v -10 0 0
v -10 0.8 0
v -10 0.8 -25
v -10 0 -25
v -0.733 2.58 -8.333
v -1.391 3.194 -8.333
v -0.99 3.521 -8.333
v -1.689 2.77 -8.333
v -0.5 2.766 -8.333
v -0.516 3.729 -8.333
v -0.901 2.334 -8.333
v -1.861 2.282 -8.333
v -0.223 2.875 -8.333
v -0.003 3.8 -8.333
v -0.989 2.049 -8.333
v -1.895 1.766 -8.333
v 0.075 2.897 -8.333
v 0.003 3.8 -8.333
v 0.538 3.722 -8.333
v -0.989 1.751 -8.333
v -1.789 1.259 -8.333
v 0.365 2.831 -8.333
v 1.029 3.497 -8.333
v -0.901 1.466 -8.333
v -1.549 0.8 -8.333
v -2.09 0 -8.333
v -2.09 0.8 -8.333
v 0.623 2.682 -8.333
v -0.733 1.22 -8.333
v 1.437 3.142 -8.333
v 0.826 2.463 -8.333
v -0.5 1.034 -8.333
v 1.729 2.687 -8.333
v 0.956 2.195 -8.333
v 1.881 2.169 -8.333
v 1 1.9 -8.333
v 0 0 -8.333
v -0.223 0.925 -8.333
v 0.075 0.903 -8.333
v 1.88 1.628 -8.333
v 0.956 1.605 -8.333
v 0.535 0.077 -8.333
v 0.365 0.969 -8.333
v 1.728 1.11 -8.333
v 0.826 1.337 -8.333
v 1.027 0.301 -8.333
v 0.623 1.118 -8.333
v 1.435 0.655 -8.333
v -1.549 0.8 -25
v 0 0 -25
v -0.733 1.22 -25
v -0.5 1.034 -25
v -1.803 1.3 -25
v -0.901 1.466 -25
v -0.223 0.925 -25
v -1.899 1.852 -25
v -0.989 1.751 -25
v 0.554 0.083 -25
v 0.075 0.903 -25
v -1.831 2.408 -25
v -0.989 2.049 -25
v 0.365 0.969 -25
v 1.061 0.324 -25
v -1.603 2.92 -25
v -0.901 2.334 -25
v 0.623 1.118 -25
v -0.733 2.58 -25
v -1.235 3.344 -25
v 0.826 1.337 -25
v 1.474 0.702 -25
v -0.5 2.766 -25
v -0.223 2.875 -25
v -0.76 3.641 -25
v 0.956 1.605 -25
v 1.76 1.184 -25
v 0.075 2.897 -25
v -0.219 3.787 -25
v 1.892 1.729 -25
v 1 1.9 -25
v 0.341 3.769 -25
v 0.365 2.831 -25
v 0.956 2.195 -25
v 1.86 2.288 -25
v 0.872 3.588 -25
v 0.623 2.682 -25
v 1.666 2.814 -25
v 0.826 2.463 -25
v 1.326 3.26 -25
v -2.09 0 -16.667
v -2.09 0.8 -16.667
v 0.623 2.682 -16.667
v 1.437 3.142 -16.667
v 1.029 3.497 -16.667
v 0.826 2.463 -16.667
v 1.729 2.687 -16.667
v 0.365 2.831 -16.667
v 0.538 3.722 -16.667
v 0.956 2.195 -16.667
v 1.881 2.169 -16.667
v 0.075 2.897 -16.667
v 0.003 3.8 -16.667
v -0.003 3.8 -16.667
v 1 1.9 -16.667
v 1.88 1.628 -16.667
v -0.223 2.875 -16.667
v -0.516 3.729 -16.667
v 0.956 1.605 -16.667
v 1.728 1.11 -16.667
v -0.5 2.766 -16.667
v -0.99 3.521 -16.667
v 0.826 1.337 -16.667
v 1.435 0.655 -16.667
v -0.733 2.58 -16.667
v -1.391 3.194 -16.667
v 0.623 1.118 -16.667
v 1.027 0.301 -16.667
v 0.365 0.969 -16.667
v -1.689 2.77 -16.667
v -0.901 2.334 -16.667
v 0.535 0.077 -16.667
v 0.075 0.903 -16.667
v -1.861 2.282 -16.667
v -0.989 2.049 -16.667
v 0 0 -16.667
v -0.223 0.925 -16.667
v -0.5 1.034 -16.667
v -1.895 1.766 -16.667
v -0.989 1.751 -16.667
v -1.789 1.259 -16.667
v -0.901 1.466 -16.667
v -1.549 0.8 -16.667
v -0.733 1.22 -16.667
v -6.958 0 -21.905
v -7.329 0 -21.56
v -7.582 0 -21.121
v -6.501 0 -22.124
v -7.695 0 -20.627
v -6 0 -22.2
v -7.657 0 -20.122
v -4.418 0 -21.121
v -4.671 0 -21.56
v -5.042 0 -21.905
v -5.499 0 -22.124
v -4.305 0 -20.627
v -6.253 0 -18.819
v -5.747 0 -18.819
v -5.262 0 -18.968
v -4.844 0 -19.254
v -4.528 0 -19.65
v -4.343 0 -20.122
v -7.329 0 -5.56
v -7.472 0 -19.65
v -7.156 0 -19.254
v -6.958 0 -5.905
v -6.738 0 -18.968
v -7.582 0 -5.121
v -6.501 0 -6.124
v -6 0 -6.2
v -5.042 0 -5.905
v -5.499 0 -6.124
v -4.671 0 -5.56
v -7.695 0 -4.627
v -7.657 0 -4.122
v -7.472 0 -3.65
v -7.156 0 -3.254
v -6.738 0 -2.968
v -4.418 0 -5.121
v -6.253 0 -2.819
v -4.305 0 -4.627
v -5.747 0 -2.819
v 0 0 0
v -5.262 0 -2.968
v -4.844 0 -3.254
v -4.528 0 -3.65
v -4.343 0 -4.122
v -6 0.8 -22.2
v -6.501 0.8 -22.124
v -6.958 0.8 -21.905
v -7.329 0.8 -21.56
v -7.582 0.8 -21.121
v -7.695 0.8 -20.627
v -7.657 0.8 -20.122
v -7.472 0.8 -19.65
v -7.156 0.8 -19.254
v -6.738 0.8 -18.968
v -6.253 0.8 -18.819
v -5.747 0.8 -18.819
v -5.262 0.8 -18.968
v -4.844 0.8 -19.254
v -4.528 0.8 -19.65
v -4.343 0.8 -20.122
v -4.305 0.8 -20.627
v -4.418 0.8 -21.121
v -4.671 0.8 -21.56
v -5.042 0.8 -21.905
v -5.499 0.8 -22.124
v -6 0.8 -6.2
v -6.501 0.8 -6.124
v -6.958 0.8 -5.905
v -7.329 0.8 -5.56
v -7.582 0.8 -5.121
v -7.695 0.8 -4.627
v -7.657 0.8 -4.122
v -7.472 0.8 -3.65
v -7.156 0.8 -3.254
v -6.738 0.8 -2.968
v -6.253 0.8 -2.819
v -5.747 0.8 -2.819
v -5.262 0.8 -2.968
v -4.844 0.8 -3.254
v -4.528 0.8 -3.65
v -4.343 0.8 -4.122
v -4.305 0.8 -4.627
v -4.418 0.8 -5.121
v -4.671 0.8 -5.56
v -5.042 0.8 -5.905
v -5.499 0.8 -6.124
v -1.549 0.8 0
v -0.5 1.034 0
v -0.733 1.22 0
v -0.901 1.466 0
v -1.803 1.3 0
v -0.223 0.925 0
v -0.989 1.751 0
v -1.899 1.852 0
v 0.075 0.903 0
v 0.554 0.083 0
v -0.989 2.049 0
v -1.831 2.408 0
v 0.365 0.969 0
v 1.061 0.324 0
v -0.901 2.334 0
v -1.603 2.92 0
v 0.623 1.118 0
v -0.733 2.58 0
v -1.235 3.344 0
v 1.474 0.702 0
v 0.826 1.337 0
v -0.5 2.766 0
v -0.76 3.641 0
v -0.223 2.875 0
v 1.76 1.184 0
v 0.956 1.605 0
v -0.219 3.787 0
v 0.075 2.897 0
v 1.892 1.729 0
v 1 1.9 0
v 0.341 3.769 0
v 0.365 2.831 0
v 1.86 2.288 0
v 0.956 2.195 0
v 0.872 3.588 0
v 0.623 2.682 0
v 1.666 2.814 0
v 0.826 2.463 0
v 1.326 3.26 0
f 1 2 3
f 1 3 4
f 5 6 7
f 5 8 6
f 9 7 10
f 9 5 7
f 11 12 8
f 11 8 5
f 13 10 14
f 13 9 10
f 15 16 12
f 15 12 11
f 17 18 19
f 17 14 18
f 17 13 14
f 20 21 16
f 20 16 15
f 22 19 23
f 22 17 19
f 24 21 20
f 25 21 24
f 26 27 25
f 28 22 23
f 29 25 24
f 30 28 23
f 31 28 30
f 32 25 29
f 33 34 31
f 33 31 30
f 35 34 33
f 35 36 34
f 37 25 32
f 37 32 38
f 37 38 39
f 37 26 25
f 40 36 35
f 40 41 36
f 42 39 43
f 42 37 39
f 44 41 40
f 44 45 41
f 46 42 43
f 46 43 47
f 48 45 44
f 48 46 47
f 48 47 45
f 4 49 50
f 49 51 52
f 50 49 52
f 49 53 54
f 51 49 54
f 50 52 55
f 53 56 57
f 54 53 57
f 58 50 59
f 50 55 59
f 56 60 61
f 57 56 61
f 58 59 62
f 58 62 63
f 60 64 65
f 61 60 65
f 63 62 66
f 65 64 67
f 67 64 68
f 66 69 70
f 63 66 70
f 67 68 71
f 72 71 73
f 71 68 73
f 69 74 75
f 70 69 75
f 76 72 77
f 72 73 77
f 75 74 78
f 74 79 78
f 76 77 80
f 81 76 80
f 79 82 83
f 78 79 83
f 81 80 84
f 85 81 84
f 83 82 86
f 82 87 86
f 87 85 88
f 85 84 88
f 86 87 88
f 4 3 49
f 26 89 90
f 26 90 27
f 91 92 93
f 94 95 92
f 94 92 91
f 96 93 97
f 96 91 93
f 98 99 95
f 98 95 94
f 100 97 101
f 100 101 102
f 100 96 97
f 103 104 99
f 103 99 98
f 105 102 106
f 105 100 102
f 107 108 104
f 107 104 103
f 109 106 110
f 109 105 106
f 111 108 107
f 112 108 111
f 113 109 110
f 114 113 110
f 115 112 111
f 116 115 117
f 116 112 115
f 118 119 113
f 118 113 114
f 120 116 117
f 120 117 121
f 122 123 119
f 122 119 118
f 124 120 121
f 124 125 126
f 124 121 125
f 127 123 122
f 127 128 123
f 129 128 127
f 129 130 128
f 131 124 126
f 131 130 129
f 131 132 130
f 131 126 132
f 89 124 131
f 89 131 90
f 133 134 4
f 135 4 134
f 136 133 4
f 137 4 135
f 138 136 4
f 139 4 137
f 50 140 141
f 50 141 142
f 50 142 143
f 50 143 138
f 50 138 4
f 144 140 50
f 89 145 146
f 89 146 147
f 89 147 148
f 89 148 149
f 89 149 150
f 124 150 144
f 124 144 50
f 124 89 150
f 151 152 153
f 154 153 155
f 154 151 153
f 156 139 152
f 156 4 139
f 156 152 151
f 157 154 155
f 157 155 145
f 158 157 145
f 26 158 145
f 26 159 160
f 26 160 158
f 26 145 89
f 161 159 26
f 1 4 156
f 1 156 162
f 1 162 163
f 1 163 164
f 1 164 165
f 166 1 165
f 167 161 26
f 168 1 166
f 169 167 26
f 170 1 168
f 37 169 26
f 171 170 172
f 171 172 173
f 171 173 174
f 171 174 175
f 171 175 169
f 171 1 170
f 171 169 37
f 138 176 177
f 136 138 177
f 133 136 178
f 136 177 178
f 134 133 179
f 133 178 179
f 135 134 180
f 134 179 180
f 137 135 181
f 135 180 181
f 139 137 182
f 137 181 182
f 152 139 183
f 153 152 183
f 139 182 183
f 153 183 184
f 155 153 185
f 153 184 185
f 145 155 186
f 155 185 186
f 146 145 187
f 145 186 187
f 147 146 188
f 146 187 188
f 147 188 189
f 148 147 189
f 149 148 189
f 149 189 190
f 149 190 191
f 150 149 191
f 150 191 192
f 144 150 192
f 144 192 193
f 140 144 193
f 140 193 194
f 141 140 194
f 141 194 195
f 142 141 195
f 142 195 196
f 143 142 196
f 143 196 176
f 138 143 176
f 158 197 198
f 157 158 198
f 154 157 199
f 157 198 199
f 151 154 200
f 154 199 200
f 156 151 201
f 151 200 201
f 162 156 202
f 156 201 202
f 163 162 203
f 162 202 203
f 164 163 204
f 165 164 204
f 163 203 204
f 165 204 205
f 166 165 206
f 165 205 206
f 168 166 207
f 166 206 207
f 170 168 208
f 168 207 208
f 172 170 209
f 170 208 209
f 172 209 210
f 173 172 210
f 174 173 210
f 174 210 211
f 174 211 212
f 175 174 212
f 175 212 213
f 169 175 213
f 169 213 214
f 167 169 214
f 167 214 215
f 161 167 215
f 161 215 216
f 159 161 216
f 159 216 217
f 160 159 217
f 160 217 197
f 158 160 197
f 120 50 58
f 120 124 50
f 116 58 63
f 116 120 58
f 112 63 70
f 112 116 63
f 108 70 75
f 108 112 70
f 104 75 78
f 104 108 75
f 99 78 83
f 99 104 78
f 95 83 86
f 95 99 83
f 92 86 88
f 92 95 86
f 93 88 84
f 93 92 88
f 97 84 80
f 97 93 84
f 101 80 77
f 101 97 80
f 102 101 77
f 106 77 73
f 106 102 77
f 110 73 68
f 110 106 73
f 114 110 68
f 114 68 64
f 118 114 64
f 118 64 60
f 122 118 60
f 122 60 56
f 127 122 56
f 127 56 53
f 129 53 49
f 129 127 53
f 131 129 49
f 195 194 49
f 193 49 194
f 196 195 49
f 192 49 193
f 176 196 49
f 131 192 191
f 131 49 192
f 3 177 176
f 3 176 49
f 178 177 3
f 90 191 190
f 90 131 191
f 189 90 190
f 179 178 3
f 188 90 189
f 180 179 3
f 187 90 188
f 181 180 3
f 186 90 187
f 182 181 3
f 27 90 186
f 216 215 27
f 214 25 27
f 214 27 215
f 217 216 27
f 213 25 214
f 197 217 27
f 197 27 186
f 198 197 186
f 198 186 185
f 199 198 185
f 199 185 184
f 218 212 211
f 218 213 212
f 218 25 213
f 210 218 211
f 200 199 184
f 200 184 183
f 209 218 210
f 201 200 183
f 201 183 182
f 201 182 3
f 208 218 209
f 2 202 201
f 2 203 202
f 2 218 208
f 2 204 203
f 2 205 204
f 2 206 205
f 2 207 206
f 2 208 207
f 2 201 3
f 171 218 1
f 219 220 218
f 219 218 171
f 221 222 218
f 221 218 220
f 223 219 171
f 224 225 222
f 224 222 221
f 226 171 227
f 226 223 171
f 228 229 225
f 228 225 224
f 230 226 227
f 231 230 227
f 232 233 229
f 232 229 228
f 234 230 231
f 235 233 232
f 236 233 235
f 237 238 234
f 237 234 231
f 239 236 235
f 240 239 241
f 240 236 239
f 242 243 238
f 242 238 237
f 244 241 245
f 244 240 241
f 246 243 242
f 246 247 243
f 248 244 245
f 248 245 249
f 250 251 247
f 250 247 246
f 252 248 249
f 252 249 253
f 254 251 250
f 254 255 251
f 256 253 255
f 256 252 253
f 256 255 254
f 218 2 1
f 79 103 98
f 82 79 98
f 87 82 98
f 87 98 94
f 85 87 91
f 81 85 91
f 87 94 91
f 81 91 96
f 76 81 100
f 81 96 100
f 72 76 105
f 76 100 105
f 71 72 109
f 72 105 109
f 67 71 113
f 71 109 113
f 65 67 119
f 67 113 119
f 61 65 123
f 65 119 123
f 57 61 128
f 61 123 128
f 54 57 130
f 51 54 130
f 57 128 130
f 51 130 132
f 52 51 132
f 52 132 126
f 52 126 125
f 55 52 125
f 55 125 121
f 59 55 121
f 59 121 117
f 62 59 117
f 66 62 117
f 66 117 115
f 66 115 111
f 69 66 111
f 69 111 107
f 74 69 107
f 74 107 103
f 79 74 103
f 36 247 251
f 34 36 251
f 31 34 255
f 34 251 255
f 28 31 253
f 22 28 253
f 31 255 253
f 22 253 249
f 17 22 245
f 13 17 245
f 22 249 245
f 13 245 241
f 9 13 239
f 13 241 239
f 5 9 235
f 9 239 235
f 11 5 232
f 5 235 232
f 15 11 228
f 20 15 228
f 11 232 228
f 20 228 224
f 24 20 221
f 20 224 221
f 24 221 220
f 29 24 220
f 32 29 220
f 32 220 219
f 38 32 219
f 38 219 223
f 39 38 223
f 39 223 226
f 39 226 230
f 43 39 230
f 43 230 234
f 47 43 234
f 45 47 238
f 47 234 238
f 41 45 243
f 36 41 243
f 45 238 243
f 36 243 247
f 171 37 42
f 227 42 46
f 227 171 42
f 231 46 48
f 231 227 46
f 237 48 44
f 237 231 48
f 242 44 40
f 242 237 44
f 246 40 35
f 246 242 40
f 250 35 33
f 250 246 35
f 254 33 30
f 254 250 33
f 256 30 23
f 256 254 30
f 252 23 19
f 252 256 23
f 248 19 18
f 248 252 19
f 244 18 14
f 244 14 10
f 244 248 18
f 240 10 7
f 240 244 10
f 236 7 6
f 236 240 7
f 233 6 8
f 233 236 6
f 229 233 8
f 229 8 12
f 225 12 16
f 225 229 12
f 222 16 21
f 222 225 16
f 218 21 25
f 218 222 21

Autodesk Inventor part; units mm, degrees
sketch "Sketch_15" plane through (0, 0, 0) normal (0, 0, 1) x (1, 0, 0)
  line L0 (-10, 0.8) -> (-10, 0)
  line L1 (-10, 0) -> (0, 0)
  arc A0 (0, 0) -> (-1.5492, 0.8) centre (0, 1.9) ccw
  line L2 (-1.5492, 0.8) -> (-10, 0.8)
  circle A1 centre (0, 1.9) radius 1
extrude "Extrusion1" add sketch "Sketch_15" against normal blind 25
sketch "Sketch_1" plane through (0, 0, 0) normal (0, 1, 0) x (-1, 0, 0)
  line L0 (2.09, -16.6667) -> (2.09, -8.3333)
  line L1 (2.09, -8.3333) -> (-2.09, -8.3333)
  line L2 (-2.09, -8.3333) -> (-2.09, 0)
  line L3 (-2.09, 0) -> (-6, 0)
  line L4 (-6, 0) -> (-6, -25)
  line L5 (-6, -25) -> (-2.09, -25)
  line L6 (-2.09, -25) -> (-2.09, -16.6667)
  line L7 (-2.09, -16.6667) -> (2.09, -16.6667)
extrude "Extrusion2" cut sketch "Sketch_1" along normal blind 3.8
sketch "Sketch3" plane through (-10, 0, 0) normal (0, -1, 0) x (1, 0, 0)
  point P0 (4, -20.5)
hole "Hole1" at (-6, 0, -20.5) direction (0, 1, 0) diameter 3.4 depth 0.8
pattern_linear "Rectangular Pattern1" count 2 spacing 16 along (0, 0, 1) of "Hole1"
ref_plane "to_leaf1_XY" through (0, 1.9, 0) normal (0, 0, 1) x (1, 0, 0)
ref_plane "to_leaf1_YZ" through (0, 1.9, 0) normal (1, 0, 0) x (0, 1, 0)
ref_plane "to_leaf1_ZX" through (0, 1.9, 0) normal (0, 1, 0) x (0, 0, 1)
properties part number "HHS25-LEAF2"
